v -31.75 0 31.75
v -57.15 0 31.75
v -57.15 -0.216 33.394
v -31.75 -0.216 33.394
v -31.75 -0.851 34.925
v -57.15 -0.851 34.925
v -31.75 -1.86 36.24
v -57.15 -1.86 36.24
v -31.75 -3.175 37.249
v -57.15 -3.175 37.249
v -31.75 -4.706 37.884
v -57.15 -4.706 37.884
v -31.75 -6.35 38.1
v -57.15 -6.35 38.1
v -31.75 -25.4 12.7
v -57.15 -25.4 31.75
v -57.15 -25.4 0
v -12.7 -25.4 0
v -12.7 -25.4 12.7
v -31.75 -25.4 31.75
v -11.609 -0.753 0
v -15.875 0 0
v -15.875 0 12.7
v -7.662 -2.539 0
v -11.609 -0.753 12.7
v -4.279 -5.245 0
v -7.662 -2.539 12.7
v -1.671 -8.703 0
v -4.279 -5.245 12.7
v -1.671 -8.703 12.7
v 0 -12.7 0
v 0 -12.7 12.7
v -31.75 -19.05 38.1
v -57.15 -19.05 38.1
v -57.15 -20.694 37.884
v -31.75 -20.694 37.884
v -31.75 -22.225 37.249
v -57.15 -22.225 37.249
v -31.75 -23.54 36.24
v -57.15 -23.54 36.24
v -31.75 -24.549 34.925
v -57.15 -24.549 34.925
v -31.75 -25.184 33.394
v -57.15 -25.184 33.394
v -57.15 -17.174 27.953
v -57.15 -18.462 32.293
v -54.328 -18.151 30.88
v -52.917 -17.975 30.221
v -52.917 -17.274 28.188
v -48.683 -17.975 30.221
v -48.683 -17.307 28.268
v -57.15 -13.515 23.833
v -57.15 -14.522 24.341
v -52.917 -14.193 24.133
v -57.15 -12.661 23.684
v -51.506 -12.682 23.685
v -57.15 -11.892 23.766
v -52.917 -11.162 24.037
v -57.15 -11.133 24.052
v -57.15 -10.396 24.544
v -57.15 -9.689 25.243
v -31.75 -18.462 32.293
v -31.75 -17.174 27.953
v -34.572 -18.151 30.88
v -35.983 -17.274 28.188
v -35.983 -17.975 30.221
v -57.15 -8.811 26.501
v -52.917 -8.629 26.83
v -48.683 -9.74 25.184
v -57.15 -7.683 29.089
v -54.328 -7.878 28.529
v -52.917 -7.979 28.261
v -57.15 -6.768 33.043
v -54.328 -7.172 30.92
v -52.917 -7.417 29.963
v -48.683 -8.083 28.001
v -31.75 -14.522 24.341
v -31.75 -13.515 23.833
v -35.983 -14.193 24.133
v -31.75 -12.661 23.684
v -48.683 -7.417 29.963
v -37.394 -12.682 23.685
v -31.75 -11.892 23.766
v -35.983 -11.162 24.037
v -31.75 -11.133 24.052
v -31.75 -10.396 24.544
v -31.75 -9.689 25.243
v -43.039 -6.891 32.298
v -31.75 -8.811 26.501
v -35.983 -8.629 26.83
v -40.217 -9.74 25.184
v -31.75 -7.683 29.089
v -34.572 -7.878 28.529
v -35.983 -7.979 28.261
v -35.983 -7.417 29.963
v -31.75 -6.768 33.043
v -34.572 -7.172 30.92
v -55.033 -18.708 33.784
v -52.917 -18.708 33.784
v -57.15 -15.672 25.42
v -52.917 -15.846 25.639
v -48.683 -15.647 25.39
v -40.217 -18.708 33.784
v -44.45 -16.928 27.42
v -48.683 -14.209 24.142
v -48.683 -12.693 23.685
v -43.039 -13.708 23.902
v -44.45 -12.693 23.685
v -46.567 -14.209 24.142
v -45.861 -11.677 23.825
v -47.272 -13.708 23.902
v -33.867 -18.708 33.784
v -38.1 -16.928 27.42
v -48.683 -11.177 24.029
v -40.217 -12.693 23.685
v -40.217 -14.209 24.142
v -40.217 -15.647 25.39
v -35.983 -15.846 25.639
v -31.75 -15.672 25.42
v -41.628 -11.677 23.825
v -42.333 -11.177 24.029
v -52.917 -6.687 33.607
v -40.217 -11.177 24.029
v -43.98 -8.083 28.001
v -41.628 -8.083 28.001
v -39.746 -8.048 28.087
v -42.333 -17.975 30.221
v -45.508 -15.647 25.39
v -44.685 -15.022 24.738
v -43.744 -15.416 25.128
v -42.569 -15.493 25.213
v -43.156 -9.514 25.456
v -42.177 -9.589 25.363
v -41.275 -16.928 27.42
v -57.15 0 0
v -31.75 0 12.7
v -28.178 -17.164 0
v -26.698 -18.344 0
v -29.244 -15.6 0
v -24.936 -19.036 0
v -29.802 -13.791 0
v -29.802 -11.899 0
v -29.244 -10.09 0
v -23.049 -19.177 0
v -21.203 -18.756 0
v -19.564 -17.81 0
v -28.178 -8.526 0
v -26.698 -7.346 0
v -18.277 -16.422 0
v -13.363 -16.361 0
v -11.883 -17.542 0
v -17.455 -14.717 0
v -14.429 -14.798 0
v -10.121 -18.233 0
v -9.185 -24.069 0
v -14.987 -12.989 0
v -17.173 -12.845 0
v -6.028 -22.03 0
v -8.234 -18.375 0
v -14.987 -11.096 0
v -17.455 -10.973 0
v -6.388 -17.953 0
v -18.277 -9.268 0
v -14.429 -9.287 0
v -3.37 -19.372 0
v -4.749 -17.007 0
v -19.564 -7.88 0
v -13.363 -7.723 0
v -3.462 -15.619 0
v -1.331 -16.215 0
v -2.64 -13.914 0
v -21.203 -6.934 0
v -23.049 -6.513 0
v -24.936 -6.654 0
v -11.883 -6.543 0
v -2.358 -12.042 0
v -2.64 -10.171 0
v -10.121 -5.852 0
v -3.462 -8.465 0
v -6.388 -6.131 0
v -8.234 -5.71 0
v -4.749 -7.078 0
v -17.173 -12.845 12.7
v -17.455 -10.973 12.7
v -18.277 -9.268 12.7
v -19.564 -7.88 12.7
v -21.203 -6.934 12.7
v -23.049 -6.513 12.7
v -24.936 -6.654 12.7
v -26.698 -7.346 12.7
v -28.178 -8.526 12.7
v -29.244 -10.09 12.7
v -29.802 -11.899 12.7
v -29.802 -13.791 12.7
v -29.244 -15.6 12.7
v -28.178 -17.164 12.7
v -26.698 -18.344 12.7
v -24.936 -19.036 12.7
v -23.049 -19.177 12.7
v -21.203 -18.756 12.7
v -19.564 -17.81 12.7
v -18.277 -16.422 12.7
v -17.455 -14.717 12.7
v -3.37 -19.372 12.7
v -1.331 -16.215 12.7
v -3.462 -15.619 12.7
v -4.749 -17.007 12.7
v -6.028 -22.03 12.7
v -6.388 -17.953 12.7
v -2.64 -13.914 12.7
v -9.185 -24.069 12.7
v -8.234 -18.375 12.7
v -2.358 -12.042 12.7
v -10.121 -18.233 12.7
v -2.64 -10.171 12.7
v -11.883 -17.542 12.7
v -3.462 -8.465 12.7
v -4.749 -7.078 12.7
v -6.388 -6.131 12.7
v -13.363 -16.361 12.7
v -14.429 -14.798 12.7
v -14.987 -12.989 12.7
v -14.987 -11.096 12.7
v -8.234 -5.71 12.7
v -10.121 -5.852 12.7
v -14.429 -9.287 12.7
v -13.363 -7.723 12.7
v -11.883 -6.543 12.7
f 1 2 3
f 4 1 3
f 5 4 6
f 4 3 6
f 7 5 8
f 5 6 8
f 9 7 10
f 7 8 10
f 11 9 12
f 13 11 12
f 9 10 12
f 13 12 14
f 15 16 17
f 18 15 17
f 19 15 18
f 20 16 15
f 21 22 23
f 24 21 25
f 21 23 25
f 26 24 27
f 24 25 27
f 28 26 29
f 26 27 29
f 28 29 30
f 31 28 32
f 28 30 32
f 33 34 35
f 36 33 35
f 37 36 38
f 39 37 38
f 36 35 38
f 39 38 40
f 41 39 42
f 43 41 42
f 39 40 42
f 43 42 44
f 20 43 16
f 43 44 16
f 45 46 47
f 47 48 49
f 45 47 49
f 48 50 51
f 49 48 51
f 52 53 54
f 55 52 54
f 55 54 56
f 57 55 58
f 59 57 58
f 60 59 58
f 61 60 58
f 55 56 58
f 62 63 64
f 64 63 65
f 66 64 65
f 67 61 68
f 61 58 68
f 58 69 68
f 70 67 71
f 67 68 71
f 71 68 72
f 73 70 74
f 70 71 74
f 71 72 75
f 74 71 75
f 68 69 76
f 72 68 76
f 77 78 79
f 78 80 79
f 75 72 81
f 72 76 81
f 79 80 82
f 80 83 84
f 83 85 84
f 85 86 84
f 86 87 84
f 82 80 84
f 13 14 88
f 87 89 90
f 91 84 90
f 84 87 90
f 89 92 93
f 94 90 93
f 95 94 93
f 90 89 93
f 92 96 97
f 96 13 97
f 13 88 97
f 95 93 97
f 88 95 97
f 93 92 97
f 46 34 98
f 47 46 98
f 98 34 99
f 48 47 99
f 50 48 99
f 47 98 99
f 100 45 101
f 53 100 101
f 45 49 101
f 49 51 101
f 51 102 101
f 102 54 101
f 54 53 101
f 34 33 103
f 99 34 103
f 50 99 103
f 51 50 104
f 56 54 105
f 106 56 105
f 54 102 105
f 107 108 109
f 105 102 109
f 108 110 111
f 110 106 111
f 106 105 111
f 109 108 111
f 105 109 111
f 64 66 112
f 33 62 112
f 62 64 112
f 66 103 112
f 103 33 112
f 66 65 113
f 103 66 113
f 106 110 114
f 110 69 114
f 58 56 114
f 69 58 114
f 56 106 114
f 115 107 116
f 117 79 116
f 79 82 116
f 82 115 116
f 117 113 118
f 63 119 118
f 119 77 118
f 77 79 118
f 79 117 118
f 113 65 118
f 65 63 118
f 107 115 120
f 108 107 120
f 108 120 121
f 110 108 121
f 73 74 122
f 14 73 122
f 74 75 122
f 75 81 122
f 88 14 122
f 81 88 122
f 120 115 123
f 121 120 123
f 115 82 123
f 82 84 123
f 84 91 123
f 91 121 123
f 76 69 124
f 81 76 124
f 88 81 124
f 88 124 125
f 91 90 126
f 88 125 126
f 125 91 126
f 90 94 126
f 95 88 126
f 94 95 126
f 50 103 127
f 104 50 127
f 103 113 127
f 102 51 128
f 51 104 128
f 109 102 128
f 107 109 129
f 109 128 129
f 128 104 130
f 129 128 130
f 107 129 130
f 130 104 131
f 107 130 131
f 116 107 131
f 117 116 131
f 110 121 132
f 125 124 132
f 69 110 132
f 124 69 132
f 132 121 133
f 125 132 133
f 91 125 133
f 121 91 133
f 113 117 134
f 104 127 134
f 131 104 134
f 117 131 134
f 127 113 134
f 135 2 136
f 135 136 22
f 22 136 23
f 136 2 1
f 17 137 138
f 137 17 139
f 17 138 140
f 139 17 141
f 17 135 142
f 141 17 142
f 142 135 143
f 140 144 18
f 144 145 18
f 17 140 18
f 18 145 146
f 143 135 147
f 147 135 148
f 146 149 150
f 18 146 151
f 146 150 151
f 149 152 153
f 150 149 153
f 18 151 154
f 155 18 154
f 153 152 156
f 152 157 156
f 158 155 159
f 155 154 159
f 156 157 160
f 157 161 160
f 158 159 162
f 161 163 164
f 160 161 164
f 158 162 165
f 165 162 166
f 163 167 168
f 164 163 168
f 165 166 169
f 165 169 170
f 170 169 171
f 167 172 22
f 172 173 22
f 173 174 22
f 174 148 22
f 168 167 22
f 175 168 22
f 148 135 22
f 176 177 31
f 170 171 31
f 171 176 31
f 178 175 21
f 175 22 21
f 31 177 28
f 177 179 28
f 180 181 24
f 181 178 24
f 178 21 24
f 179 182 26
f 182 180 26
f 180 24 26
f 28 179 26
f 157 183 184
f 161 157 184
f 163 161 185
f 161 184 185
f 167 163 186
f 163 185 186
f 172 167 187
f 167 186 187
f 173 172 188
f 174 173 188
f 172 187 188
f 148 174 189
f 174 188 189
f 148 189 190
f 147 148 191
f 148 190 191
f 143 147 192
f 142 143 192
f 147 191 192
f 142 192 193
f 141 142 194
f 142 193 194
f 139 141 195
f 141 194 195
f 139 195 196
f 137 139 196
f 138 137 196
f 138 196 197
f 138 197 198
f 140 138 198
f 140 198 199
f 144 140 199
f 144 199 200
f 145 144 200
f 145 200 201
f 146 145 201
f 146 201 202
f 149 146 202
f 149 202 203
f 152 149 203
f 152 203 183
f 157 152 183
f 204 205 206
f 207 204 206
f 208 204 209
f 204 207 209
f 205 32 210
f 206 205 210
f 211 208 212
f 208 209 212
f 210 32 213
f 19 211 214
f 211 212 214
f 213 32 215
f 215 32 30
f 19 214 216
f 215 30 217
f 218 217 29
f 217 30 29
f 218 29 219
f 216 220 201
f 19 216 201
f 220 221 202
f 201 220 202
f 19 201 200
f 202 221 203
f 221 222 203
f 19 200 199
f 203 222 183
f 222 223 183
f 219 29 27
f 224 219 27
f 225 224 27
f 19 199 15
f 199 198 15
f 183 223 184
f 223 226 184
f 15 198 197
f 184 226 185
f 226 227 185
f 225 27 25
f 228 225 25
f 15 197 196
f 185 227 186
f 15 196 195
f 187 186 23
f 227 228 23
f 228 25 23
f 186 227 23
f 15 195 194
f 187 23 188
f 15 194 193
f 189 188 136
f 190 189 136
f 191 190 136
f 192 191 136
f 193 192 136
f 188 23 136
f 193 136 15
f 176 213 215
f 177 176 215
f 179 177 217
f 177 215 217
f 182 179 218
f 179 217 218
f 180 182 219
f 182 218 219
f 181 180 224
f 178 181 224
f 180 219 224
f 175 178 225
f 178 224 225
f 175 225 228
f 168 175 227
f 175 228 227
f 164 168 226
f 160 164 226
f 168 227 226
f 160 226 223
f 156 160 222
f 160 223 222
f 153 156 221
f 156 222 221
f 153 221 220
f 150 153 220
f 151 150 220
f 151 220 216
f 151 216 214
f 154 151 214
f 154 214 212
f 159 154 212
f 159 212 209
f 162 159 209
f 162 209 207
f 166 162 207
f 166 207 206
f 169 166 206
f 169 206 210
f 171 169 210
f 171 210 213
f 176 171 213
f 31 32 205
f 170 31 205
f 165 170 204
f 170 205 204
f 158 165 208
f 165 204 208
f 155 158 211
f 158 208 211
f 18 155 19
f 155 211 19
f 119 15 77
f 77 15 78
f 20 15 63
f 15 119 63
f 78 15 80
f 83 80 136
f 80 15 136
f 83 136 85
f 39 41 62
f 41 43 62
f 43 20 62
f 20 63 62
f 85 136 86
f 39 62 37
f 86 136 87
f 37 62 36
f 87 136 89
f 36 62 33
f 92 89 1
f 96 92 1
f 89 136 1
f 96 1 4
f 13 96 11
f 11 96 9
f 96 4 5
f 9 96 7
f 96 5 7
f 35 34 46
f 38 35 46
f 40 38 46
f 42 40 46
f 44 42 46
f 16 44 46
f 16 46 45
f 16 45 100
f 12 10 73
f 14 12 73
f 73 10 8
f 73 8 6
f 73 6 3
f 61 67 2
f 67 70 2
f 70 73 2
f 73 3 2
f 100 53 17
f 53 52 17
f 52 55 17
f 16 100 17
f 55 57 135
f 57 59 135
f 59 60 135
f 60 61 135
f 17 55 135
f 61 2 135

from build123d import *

# Parameters (mm, degrees)
F1_DEPTH = 25.4
F3_DEPTH = 25.4
F5_DEPTH = 25.4
F6_R     = 6.35
F7_DEPTH = 25.4
F9_DEPTH = 25.4


with BuildPart() as f1:
    # F0 (on Front) → F1 (new body)
    with BuildSketch(Plane.XZ):
        Polygon((-31.75, 38.1), (-57.15, 38.1), (-57.15, 0), (0, 0), (0, 12.7), (-31.75, 12.7), align=None)
    extrude(amount=F1_DEPTH)

    # F2 (on face) → F3 (cut)
    with BuildSketch(Plane.YZ.offset(-31.75)):
        with BuildLine():
            Line((-6.35, 38.1), (-19.05, 38.1))
            add(Edge.make_bspline(
                [(-19.05, 38.1), (-18.5709856451, 19.3447768688), (-6.809361279, 18.4162277728), (-6.35, 38.1)],
                knots=[0, 0, 0, 0, 12.7, 12.7, 12.7, 12.7], degree=3))
        make_face()
    extrude(amount=-F3_DEPTH, mode=Mode.SUBTRACT)

    # F4 (on face) → F5 (cut)
    with BuildSketch(Plane.XY.offset(12.7)):
        with BuildLine():
            Line((0, -25.4), (0, -12.7))
            ThreePointArc((0, -12.7), (-4.6286120427, -20.7713879573), (-12.7, -25.4))
            Line((-12.7, -25.4), (0, -25.4))
        make_face()
        with BuildLine():
            ThreePointArc((-15.875, 0), (-5.8860880189, -3.7857350236), (0, -12.7))
            Line((0, -12.7), (0, 0))
            Line((0, 0), (-15.875, 0))
        make_face()
    extrude(amount=-F5_DEPTH, mode=Mode.SUBTRACT)

    # F6 (on face) → F7 (cut)
    with BuildSketch(Plane.XY.offset(12.7)):
        with Locations((-23.5232505947, -12.8449322656)):
            Circle(F6_R)
        with Locations((-8.7082285261, -12.0423395505)):
            Circle(F6_R)
    extrude(amount=-F7_DEPTH, mode=Mode.SUBTRACT)

    # F8 (on face) → F9 (cut)
    with BuildSketch(Plane(origin=(-57.15, 0, 0), x_dir=(0, -1, 0), z_dir=(-1, 0, 0))):
        with BuildLine():
            Line((25.4, 38.1), (19.05, 38.1))
            ThreePointArc((19.05, 38.1), (23.5401280605, 36.2401280605), (25.4, 31.75))
            Line((25.4, 31.75), (25.4, 38.1))
        make_face()
        with BuildLine():
            ThreePointArc((0, 31.75), (1.8598719395, 36.2401280605), (6.35, 38.1))
            Line((6.35, 38.1), (0, 38.1))
            Line((0, 38.1), (0, 31.75))
        make_face()
    extrude(amount=-F9_DEPTH, mode=Mode.SUBTRACT)


solid = f1.part
